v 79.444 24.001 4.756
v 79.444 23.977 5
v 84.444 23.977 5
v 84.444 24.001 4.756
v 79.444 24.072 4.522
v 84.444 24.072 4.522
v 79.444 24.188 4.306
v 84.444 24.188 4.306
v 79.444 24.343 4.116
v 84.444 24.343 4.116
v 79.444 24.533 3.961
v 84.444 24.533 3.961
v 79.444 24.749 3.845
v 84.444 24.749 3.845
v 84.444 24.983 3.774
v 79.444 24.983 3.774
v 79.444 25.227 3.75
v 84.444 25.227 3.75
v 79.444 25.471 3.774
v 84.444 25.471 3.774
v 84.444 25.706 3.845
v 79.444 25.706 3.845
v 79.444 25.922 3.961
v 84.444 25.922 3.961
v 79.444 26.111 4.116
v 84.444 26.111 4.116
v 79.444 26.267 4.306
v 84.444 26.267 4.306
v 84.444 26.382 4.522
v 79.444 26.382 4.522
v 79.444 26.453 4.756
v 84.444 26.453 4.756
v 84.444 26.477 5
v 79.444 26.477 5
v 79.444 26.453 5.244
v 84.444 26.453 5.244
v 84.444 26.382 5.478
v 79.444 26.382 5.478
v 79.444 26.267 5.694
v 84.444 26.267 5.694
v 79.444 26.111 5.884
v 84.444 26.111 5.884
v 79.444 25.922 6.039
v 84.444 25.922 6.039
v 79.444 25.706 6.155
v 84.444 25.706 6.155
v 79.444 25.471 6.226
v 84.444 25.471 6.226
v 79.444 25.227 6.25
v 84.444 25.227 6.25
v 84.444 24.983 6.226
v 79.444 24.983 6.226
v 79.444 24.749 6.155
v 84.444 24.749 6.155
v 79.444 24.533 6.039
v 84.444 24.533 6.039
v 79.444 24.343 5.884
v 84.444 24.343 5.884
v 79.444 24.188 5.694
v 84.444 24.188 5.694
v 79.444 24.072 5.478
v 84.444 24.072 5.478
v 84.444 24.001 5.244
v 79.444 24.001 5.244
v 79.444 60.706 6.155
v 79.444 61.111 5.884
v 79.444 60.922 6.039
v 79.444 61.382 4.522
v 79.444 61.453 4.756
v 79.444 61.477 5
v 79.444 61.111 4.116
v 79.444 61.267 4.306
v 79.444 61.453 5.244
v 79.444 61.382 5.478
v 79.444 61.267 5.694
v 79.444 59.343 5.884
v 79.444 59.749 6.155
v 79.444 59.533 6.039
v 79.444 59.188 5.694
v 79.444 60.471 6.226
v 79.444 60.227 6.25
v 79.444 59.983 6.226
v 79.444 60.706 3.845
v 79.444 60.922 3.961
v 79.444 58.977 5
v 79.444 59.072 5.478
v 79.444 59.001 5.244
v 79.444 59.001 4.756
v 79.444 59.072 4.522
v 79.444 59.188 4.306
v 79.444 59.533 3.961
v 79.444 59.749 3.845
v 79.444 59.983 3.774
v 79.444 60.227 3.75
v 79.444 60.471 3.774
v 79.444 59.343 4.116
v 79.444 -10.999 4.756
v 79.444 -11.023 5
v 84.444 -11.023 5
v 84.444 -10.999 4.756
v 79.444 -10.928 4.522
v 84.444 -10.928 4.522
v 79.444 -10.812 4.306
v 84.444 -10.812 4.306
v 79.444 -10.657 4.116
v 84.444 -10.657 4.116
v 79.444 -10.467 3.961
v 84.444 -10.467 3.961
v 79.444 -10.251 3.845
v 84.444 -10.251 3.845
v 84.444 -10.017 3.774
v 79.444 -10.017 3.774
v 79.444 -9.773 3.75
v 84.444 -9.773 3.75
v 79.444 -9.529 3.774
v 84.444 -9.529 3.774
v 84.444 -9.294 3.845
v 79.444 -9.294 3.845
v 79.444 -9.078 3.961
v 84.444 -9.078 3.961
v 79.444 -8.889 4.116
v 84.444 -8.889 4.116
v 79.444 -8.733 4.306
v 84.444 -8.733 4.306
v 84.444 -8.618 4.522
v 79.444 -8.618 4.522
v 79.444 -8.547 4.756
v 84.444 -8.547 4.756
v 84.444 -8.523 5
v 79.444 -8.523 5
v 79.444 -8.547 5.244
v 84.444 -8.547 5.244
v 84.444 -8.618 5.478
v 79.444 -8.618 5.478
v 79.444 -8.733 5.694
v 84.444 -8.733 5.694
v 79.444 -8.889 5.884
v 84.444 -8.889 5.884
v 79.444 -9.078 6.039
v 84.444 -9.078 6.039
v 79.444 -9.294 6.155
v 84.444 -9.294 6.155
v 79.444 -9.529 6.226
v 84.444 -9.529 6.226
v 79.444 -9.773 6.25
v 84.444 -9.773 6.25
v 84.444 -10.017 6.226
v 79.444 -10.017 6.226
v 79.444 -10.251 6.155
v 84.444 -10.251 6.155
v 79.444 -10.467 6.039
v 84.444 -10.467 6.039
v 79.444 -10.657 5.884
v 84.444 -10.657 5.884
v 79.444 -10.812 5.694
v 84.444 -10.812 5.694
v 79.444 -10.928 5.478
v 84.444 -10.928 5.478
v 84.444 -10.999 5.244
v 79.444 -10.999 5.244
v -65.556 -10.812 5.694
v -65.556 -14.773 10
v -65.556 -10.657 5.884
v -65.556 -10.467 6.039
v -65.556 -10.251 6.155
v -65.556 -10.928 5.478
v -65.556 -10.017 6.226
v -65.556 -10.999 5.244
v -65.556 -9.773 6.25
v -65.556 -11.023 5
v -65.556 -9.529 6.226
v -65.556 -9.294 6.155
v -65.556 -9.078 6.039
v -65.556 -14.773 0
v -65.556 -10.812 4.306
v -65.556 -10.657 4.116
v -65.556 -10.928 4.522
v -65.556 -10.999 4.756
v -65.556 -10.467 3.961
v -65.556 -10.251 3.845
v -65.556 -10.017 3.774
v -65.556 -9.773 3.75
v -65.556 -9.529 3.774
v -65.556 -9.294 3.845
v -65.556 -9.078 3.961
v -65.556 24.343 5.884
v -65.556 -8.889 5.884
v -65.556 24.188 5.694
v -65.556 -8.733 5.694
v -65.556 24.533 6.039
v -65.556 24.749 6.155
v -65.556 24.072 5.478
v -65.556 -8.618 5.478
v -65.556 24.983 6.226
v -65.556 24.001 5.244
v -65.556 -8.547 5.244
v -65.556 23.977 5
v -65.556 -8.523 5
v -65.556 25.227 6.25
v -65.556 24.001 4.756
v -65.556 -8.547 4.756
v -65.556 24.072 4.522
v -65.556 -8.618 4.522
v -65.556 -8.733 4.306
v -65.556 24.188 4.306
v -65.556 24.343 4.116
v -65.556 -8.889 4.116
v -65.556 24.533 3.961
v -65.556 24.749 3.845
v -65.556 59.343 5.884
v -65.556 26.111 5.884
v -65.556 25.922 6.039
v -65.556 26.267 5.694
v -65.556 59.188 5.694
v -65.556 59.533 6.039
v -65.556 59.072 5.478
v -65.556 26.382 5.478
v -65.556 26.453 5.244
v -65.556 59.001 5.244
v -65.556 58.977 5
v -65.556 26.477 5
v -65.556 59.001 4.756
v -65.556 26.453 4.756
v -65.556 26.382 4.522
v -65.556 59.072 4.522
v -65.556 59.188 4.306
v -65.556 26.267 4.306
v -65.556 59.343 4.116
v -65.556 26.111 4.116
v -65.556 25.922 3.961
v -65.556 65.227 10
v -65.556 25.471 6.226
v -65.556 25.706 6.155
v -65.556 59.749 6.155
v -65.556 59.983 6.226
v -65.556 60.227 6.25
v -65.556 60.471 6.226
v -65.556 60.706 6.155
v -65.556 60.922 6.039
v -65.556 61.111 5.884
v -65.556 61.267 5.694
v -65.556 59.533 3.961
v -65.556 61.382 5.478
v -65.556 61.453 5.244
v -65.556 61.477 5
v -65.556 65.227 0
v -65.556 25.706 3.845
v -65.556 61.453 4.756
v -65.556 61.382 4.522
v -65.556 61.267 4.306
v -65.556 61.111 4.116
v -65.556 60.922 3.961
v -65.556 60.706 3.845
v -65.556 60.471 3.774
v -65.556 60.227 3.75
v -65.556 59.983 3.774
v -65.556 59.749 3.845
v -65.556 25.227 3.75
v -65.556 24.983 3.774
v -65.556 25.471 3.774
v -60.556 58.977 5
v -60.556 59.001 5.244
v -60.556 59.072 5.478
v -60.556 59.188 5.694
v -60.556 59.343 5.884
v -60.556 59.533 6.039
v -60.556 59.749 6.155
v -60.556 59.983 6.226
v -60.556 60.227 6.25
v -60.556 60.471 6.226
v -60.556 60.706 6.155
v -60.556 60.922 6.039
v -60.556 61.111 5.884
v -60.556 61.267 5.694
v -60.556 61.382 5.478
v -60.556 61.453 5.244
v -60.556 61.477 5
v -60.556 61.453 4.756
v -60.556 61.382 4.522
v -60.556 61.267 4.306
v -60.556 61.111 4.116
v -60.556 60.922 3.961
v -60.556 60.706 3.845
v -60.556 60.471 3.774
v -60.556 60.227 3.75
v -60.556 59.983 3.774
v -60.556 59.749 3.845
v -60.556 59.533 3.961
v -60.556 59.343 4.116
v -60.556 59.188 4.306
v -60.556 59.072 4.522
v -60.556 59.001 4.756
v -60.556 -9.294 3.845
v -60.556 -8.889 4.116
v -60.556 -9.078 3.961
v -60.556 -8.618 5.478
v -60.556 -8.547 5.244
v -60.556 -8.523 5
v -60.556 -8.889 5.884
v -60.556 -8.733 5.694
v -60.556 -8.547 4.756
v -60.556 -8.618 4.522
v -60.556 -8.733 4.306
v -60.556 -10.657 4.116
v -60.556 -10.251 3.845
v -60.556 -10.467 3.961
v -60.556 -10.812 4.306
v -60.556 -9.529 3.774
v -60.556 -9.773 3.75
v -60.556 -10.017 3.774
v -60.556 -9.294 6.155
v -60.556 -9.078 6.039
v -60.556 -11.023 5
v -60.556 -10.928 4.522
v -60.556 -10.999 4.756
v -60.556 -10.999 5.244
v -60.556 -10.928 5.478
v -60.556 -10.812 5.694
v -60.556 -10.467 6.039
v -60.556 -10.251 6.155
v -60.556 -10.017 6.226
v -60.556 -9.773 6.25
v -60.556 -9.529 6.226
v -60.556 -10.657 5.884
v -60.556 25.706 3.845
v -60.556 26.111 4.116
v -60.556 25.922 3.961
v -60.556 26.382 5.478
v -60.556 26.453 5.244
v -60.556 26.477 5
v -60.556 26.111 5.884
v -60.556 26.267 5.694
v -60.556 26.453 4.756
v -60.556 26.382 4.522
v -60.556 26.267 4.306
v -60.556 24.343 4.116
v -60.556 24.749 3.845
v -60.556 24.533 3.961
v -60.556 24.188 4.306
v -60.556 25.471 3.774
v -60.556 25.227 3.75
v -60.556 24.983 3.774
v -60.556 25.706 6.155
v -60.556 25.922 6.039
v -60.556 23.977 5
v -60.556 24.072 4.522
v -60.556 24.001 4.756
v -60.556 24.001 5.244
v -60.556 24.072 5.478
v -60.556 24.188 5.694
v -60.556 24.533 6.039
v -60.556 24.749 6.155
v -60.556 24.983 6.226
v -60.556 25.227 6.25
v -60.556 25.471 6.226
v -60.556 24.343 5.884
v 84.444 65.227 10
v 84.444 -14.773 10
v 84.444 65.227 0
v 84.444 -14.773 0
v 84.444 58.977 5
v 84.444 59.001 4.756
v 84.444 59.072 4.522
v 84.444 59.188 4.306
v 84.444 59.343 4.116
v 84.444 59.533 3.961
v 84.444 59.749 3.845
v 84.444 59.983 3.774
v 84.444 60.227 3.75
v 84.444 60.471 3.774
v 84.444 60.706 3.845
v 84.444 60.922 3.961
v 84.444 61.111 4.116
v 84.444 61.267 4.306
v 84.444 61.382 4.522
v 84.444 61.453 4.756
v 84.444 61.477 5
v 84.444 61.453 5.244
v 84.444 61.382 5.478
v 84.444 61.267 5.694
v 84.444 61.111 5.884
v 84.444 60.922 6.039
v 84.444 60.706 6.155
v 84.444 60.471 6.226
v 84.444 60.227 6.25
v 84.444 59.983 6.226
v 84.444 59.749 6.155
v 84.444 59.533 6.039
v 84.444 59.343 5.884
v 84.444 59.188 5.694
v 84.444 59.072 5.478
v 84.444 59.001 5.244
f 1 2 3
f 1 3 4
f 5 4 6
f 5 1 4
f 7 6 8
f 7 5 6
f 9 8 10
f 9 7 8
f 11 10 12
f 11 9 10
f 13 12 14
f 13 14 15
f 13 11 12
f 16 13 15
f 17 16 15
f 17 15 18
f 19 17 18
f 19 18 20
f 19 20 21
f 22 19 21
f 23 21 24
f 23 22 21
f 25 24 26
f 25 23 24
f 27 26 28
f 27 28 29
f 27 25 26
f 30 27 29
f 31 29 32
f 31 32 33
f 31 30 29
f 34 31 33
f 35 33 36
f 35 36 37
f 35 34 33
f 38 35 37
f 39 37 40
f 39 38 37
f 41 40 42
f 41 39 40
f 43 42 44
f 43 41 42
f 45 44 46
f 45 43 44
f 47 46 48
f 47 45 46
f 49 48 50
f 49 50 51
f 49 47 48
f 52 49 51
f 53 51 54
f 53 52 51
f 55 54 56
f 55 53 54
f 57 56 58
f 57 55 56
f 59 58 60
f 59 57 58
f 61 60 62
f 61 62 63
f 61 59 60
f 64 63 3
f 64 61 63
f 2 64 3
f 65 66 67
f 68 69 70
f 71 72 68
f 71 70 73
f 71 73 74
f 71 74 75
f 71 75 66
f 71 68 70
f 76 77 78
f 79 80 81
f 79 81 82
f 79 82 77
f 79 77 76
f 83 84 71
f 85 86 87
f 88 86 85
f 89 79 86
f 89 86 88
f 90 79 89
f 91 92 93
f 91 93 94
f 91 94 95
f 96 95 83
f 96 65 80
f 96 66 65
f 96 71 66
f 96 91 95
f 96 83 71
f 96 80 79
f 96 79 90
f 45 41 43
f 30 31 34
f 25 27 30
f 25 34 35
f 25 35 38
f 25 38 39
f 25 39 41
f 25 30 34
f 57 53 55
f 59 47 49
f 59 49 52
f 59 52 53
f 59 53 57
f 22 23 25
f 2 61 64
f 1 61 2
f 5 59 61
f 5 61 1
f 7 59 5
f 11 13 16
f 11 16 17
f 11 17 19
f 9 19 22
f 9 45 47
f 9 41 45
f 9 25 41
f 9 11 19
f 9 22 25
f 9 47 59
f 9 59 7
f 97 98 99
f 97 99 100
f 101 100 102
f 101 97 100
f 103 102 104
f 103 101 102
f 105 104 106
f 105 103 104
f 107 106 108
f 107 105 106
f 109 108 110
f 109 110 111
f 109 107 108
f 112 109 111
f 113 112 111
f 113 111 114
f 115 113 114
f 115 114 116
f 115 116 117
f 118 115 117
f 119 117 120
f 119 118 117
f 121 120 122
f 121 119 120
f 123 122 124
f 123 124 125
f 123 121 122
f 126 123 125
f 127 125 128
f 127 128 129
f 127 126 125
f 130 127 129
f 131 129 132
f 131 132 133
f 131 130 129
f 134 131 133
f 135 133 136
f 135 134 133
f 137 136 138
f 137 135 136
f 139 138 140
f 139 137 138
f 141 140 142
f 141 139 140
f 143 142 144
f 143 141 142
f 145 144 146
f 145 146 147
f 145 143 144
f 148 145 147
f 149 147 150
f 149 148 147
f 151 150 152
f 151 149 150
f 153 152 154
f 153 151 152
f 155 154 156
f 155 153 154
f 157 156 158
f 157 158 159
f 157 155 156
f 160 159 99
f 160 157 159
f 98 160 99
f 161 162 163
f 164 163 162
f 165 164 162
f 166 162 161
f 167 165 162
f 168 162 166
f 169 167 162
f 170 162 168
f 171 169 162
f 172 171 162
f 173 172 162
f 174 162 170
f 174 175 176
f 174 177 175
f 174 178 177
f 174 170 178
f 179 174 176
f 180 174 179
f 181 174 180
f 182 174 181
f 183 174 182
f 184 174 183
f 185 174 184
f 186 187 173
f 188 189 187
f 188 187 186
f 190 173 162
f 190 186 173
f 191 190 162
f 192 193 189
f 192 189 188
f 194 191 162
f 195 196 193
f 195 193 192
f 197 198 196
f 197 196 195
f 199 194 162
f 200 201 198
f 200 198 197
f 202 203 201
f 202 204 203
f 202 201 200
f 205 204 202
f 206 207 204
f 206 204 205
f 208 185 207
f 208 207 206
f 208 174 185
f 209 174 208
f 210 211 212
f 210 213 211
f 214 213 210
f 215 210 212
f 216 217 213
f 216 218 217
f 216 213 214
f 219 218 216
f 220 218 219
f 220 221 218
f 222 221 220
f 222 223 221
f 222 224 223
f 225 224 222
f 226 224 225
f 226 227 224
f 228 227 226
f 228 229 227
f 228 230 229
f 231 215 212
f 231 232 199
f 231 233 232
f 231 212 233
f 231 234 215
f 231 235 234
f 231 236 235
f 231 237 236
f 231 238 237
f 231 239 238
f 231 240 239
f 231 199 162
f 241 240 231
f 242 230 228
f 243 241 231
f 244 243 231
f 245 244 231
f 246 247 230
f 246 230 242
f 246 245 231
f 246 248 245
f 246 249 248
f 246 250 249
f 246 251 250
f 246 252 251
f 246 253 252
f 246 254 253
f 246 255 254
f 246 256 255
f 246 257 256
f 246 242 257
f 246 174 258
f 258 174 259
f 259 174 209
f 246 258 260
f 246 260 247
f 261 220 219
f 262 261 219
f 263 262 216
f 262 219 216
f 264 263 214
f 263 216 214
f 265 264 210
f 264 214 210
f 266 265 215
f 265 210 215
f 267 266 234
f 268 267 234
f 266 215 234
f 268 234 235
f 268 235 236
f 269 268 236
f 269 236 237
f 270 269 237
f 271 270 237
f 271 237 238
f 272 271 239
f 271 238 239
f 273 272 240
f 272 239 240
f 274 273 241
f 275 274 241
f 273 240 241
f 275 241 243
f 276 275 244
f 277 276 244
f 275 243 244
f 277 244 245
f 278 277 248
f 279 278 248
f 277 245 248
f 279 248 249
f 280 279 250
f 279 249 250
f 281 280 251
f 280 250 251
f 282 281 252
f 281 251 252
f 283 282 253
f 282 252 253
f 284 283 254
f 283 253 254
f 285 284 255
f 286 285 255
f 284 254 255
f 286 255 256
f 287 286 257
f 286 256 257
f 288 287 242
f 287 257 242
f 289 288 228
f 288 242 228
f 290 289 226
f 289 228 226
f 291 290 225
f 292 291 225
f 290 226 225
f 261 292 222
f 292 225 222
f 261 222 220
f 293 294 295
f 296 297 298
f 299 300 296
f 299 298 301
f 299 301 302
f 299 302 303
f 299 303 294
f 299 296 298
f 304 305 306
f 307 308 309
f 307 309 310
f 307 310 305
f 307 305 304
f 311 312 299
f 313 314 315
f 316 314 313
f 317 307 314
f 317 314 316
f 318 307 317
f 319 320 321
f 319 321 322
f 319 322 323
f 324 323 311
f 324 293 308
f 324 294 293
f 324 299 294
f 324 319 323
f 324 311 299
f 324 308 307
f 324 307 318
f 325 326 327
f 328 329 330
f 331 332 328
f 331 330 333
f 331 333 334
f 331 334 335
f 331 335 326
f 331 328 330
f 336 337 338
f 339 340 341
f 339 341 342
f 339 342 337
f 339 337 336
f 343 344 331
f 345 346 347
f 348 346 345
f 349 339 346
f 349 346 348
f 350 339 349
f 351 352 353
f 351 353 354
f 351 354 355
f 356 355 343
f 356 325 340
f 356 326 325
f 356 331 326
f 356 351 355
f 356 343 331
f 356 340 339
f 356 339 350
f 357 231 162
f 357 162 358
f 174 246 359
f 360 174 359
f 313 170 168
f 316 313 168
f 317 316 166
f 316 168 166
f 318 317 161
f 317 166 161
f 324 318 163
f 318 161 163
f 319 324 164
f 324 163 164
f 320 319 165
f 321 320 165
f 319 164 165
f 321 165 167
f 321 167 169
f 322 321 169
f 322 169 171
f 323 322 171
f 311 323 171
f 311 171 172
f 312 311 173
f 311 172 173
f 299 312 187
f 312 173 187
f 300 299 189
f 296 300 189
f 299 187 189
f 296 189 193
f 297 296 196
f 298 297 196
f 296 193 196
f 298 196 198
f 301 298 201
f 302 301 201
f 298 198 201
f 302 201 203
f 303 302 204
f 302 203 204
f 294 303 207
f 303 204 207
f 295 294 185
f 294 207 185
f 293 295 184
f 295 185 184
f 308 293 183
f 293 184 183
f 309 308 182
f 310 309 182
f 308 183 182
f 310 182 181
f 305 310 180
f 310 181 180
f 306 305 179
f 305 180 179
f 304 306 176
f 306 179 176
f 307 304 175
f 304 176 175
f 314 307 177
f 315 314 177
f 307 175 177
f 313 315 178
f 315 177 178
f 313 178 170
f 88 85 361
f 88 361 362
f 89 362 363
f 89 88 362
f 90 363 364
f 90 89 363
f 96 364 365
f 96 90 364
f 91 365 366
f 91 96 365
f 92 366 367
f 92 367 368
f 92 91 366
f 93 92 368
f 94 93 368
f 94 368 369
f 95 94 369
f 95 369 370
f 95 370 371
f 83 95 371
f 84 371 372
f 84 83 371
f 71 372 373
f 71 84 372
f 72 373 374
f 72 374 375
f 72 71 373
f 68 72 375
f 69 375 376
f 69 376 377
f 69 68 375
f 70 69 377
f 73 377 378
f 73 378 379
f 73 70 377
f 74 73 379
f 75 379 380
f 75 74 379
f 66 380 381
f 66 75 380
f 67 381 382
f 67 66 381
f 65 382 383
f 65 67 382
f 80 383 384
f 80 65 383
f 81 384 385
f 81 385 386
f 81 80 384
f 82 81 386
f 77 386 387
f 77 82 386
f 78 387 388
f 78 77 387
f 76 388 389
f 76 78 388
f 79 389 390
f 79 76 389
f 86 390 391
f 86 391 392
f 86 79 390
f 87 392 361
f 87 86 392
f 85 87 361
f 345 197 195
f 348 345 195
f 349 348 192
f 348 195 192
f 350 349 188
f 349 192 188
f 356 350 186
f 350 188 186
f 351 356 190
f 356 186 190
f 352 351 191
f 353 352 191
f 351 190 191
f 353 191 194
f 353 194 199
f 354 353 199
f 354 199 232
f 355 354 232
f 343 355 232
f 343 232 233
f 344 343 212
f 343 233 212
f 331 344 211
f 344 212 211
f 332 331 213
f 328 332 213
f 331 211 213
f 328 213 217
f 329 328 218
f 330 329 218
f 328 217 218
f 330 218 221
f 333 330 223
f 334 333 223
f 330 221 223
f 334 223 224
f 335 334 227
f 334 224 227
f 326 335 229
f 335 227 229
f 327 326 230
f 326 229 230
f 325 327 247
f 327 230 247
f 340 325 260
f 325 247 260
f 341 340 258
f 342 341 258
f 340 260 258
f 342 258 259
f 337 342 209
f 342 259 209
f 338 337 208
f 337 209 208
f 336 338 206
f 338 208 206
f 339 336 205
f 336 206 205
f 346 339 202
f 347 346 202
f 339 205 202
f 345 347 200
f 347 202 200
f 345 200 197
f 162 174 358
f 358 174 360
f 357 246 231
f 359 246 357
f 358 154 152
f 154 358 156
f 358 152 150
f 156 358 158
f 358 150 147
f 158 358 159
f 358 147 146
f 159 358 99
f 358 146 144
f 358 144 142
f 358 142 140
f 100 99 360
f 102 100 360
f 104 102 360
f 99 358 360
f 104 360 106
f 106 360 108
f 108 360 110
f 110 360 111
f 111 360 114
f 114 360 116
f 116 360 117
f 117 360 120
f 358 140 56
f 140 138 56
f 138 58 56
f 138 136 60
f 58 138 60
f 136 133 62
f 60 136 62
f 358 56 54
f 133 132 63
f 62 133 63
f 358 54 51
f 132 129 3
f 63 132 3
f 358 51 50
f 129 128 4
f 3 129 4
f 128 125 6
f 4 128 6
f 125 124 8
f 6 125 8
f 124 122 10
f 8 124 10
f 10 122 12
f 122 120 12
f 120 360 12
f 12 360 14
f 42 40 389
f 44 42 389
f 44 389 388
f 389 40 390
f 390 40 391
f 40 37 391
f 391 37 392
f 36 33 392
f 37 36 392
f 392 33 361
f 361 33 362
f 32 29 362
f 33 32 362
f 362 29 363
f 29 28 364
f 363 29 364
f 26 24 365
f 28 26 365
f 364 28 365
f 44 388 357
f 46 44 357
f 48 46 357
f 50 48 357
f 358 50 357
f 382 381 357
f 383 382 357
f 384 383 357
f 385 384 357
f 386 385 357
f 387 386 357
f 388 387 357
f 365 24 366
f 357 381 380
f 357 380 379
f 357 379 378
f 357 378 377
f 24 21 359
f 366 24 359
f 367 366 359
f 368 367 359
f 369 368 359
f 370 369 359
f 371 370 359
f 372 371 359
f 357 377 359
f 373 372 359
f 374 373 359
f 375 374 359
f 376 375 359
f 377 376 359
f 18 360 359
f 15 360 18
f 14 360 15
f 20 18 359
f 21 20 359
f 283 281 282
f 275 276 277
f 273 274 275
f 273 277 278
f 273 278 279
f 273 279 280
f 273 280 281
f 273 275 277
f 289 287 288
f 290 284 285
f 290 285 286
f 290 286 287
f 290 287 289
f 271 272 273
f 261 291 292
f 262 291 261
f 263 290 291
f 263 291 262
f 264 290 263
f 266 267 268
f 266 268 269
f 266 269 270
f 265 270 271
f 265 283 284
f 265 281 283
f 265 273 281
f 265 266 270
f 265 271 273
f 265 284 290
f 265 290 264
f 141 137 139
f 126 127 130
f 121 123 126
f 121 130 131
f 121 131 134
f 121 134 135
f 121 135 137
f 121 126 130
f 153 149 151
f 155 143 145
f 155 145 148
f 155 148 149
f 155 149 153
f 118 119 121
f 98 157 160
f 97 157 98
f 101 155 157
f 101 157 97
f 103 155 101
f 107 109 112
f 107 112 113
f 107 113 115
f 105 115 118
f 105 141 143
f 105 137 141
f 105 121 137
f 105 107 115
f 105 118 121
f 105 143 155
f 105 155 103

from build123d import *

# Parameters (mm, degrees)
SKIZZE1_W                       = 150
SKIZZE1_H                       = 80
AUFSATZ_LINEAR_AUSTRAGEN1_DEPTH = 10
SKIZZE2_R                       = 1.25
SCHNITT_LINEAR_AUSTRAGEN1_DEPTH = 5
SCHNITT_LINEAR_START            = -5
SKIZZE3_R                       = 1.25
SCHNITT_LINEAR_AUSTRAGEN2_DEPTH = 5


with BuildPart() as part:
    # Skizze1 → Aufsatz-Linear austragen1 (new body)
    with BuildSketch(Plane.XY):
        with Locations((9.444388014, 25.227272727)):
            Rectangle(SKIZZE1_W, SKIZZE1_H)
    extrude(amount=AUFSATZ_LINEAR_AUSTRAGEN1_DEPTH)

    # Skizze2 → Schnitt-Linear austragen1 (cut)
    with BuildSketch(Plane.ZY.offset(65.555611986)):
        with Locations(Location((5, 60.227272727, 0), (0, 0, 270))):
            Circle(SKIZZE2_R)
        with Locations(Location((5, 25.227272727, 0), (0, 0, 270))):
            Circle(SKIZZE2_R)
        with Locations(Location((5, -9.772727273, 0), (0, 0, 270))):
            Circle(SKIZZE2_R)
    extrude(amount=-SCHNITT_LINEAR_AUSTRAGEN1_DEPTH, mode=Mode.SUBTRACT)

    # Skizze3 → Schnitt-Linear austragen2 (cut)
    with BuildSketch(Plane(origin=(84.444388014, 0, 0), x_dir=(0, 0, -1), z_dir=(1, 0, 0)).offset(SCHNITT_LINEAR_START)):
        with Locations(Location((-5, 60.227272727, 0), (0, 0, 270))):
            Circle(SKIZZE3_R)
        with Locations(Location((-5, 25.227272727, 0), (0, 0, 270))):
            Circle(SKIZZE3_R)
        with Locations(Location((-5, -9.772727273, 0), (0, 0, 270))):
            Circle(SKIZZE3_R)
    extrude(amount=SCHNITT_LINEAR_AUSTRAGEN2_DEPTH, mode=Mode.SUBTRACT)


solid = part.part
